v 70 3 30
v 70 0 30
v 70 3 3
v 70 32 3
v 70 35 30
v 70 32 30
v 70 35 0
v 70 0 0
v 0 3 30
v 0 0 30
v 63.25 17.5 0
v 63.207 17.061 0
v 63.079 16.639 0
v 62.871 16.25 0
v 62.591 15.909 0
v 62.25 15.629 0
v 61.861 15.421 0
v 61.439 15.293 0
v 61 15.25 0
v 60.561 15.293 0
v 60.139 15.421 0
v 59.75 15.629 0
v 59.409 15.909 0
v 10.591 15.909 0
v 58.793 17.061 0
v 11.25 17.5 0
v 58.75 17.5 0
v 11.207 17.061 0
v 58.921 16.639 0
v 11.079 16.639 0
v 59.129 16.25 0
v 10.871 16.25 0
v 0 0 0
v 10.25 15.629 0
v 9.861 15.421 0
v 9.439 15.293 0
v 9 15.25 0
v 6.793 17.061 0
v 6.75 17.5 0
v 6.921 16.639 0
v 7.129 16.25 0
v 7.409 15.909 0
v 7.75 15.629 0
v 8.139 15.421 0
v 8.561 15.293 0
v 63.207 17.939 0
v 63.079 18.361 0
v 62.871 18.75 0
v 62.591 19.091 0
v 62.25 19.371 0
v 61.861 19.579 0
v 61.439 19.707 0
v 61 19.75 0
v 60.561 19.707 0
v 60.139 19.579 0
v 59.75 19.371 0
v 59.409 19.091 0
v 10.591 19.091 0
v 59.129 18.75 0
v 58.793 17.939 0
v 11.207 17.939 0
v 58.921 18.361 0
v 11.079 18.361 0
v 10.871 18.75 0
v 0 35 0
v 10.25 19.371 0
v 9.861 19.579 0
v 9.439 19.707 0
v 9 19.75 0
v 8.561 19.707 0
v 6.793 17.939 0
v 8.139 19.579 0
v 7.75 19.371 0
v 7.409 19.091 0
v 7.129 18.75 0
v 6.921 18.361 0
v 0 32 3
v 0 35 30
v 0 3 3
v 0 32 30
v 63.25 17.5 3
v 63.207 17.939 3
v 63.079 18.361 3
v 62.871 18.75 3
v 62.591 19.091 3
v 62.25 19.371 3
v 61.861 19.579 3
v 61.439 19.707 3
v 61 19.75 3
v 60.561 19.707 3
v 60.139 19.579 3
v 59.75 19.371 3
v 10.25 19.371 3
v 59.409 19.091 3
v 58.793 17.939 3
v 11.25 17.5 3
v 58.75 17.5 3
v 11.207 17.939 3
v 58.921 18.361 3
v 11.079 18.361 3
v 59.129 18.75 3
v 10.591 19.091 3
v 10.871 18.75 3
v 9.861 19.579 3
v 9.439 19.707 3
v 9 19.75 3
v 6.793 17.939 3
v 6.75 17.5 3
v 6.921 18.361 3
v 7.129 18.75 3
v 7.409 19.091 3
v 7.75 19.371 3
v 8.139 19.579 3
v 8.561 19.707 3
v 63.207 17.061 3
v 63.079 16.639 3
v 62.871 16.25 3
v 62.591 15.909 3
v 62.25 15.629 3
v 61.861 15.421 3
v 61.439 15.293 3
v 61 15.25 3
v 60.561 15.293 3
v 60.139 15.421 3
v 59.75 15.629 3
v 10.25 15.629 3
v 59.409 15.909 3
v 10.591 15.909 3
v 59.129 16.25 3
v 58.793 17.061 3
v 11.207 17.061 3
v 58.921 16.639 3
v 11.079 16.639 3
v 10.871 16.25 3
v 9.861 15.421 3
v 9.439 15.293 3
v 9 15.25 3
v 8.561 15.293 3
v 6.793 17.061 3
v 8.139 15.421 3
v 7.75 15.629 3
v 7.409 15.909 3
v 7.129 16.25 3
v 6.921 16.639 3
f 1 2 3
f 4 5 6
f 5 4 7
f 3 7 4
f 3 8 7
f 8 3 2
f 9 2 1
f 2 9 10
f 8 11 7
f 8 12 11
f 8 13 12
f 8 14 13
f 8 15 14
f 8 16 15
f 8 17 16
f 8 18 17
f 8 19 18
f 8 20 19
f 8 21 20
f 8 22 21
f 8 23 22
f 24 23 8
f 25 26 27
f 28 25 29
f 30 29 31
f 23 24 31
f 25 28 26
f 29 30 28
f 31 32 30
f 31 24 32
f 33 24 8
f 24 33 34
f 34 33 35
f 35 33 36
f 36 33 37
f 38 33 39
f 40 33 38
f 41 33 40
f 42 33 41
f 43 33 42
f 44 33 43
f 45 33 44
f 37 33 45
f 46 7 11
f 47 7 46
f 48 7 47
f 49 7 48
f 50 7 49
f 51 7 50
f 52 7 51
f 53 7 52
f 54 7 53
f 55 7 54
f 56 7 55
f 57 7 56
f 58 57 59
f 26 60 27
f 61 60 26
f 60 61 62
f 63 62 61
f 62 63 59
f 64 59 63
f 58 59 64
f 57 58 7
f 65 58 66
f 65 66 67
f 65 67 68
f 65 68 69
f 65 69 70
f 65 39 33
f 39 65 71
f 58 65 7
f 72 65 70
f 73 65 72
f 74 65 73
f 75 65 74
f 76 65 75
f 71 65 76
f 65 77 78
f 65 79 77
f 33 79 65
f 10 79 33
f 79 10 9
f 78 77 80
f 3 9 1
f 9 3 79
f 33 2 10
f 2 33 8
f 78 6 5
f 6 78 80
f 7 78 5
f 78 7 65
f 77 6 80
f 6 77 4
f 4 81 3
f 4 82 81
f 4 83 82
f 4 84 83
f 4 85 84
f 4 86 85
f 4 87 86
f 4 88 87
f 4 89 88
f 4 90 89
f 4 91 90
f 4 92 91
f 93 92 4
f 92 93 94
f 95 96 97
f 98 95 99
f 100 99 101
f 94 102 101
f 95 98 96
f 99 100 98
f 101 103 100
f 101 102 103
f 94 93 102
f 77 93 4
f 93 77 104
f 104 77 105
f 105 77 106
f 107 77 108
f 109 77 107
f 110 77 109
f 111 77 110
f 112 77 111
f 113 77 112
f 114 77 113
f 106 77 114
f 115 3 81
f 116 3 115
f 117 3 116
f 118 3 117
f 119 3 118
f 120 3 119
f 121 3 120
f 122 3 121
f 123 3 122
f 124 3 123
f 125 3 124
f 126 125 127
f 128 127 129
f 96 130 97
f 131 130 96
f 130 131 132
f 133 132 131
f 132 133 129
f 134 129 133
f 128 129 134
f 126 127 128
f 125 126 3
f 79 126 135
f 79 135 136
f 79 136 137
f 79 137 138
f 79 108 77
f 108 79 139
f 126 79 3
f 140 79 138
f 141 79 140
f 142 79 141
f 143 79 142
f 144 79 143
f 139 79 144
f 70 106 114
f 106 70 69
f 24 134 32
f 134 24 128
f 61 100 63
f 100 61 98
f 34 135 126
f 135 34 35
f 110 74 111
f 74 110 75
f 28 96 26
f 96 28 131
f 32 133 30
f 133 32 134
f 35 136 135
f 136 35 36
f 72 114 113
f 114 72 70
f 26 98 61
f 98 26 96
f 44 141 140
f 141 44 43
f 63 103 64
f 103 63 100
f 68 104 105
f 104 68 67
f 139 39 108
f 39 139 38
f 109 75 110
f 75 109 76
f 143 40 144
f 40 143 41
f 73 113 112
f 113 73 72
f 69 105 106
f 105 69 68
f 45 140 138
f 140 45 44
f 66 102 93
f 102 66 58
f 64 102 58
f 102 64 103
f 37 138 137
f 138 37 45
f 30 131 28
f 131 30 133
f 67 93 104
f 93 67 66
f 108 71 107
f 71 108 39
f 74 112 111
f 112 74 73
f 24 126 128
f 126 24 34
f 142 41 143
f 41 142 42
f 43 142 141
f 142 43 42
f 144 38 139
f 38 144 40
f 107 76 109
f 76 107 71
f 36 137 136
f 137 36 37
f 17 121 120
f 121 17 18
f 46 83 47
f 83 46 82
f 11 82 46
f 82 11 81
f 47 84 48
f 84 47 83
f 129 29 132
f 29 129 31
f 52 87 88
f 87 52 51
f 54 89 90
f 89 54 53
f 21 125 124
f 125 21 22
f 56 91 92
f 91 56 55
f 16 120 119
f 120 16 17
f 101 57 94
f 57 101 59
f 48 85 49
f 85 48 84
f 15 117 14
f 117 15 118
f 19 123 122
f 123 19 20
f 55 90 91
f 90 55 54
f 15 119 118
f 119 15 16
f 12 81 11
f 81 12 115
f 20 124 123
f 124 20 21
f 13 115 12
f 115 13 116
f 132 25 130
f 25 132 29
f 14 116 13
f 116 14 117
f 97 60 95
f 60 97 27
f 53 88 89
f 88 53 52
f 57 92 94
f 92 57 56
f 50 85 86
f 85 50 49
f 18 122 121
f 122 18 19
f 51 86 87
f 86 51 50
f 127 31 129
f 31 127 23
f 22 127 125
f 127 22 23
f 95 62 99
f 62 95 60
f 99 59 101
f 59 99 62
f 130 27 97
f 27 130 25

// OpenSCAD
$fn = 32;

// ----------------------------------------------------------------------
// U-bracket: 70 x 35 x 30 mm
// ----------------------------------------------------------------------

// --- parameters (mm) ---
length = 70;              // outer length, X
width = 35;               // outer width, Y
height = 30;              // upright height, Z
thick = 3;                // wall thickness
hole_d = 4.5;             // clearance for M4

module hole_z(px, py) {
  translate([px, py, -0.5]) cylinder(h = thick + 1, d = hole_d);
}
module hole_y_pz(pz) {
  /* through both uprights along Y */
  translate([0, -0.5, pz]) rotate([-90, 0, 0]) cylinder(h = width + 1, d = hole_d);
}

module base() {
  cube([length, width, thick]);
}

module uprights() {
  cube([length, thick, height]);
  translate([0, width - thick, 0]) cube([length, thick, height]);
}

difference() {
  union() {
    base();
    uprights();
  }
  hole_z(9, 17.5);
  hole_z(61, 17.5);
}
